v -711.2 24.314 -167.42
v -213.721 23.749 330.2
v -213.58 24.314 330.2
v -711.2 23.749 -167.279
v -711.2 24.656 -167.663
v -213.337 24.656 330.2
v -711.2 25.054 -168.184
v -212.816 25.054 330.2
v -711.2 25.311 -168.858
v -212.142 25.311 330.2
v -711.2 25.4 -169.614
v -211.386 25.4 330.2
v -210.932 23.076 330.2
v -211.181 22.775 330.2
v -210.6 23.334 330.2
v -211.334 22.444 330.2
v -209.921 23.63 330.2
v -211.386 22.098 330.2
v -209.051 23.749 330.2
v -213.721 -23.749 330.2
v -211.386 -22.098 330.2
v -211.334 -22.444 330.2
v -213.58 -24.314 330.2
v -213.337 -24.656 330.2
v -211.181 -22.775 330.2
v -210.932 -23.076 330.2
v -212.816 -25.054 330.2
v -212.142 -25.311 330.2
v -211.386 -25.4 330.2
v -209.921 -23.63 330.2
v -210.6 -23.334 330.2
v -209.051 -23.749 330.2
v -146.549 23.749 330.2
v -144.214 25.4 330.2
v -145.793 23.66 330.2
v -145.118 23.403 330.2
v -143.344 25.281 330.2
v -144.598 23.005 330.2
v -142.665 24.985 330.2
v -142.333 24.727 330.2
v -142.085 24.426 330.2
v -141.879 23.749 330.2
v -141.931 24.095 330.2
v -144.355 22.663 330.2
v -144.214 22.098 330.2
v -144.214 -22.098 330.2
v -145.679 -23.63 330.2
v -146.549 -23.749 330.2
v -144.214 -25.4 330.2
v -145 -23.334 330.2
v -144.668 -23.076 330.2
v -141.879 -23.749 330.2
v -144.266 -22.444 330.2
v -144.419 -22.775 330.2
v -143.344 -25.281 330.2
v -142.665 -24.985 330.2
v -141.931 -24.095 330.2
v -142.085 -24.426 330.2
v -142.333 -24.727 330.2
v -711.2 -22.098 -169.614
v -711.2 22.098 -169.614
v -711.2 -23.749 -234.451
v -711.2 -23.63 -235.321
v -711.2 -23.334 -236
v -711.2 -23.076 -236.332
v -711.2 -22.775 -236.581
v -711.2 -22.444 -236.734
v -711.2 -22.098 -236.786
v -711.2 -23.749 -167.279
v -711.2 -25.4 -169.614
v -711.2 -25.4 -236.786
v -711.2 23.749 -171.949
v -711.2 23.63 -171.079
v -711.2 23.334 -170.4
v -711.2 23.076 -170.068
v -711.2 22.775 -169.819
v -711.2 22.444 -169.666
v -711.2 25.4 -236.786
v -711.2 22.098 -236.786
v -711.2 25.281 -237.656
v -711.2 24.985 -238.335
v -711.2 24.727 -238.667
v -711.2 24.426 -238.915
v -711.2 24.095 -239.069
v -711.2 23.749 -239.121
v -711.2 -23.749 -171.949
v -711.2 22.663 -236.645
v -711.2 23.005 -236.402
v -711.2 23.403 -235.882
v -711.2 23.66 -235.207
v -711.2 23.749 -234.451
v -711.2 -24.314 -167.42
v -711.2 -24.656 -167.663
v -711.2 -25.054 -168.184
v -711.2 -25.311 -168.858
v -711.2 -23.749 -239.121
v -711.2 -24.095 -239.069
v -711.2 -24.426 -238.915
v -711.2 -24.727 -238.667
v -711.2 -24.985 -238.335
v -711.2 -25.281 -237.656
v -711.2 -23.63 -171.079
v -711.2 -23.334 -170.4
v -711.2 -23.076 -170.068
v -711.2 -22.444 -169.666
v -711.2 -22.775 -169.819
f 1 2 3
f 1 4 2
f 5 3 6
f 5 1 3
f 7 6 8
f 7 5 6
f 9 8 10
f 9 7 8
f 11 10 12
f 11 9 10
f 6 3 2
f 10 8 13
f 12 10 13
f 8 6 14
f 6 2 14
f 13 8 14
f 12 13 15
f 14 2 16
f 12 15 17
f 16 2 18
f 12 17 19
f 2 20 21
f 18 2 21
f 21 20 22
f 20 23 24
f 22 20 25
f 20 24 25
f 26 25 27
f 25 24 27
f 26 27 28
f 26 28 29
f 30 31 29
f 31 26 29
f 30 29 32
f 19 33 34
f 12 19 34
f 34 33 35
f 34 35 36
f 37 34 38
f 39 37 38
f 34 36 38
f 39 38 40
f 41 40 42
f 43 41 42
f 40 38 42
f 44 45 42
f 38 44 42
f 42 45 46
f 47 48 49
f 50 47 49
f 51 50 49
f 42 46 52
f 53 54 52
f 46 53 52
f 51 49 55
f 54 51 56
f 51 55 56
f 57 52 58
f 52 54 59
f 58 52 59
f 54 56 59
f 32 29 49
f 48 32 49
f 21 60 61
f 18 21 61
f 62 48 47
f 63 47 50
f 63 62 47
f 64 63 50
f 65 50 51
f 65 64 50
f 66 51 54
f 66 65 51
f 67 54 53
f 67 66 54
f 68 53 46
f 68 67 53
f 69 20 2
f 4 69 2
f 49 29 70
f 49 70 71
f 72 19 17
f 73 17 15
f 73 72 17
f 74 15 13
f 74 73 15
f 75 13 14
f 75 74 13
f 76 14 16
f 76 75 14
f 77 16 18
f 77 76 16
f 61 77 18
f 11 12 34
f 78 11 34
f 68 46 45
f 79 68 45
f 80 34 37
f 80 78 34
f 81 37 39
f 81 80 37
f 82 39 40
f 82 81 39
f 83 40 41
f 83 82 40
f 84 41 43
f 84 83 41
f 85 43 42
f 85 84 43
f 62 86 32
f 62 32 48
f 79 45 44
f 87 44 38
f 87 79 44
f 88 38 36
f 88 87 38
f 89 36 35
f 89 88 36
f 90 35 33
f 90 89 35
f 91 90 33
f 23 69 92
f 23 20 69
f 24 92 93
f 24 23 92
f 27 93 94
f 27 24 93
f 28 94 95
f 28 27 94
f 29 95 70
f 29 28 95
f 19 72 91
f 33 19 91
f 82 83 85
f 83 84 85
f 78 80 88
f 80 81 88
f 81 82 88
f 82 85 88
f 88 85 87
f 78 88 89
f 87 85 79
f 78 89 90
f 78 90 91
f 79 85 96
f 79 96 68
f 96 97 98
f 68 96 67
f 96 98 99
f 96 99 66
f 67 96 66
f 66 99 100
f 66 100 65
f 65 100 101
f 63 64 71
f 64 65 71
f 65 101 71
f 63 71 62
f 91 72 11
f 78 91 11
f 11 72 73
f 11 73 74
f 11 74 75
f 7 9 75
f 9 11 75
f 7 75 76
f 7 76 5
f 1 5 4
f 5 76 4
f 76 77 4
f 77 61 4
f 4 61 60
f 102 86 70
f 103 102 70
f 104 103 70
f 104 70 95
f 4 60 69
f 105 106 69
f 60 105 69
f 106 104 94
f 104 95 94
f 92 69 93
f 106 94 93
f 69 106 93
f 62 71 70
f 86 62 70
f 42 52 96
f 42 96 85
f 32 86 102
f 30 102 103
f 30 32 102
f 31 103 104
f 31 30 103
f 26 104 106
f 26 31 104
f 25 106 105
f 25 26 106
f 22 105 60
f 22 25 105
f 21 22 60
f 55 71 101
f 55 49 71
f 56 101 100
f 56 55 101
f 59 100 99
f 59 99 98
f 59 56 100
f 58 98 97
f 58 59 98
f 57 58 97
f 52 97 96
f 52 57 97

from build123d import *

# Parameters (mm, degrees)
F3_W          = 50.8
F3_H          = 50.8
F3_W_2        = 47.498
F3_H_2        = 47.498
F4_DEPTH      = 25.4
F4_DEPTH_BACK = 787.4
F0_W          = 1524
F0_H          = 762
F0_W_2        = 1422.4
F0_H_2        = 660.4
F5_DEPTH      = 63.5
F6_R          = 1.651
F7_R          = 1.651


with BuildPart() as f4:
    # F3 (on line) → F4 (new body, two sides)
    with BuildSketch(Plane(origin=(-457.2, 0, -457.2), x_dir=(0.7071067812, 0, -0.7071067812), z_dir=(0.7071067812, 0, 0.7071067812))) as f4_sk:
        with Locations((-359.2102448428, 0)):
            Rectangle(F3_W, F3_H)
        with Locations((-359.2102448428, 0)):
            Rectangle(F3_W_2, F3_H_2, mode=Mode.SUBTRACT)
    extrude(amount=-F4_DEPTH)
    extrude(f4_sk.sketch, amount=F4_DEPTH_BACK)

    # F0 (on Front) → F5 (cut, symmetric)
    with BuildSketch(Plane.XZ):
        Rectangle(F0_W, F0_H)
        Rectangle(F0_W_2, F0_H_2, mode=Mode.SUBTRACT)
    extrude(amount=F5_DEPTH, both=True, mode=Mode.SUBTRACT)

    # F6
    f6_edges = [f4.edges().sort_by_distance(p)[0] for p in [
        (-462.460512, -25.4, 81.460512),
        (-462.460512, 25.4, 81.460512),
        (-426.539488, 25.4, 45.539488),
        (-426.539488, -25.4, 45.539488),
    ]]
    fillet(f6_edges, radius=F6_R)

    # F7
    f7_edges = [f4.edges().sort_by_distance(p)[0] for p in [
        (-427.706921, 23.749, 46.706921),
        (-427.706921, -23.749, 46.706921),
        (-461.293079, -23.749, 80.293079),
        (-461.293079, 23.749, 80.293079),
    ]]
    fillet(f7_edges, radius=F7_R)


solid = f4.part
